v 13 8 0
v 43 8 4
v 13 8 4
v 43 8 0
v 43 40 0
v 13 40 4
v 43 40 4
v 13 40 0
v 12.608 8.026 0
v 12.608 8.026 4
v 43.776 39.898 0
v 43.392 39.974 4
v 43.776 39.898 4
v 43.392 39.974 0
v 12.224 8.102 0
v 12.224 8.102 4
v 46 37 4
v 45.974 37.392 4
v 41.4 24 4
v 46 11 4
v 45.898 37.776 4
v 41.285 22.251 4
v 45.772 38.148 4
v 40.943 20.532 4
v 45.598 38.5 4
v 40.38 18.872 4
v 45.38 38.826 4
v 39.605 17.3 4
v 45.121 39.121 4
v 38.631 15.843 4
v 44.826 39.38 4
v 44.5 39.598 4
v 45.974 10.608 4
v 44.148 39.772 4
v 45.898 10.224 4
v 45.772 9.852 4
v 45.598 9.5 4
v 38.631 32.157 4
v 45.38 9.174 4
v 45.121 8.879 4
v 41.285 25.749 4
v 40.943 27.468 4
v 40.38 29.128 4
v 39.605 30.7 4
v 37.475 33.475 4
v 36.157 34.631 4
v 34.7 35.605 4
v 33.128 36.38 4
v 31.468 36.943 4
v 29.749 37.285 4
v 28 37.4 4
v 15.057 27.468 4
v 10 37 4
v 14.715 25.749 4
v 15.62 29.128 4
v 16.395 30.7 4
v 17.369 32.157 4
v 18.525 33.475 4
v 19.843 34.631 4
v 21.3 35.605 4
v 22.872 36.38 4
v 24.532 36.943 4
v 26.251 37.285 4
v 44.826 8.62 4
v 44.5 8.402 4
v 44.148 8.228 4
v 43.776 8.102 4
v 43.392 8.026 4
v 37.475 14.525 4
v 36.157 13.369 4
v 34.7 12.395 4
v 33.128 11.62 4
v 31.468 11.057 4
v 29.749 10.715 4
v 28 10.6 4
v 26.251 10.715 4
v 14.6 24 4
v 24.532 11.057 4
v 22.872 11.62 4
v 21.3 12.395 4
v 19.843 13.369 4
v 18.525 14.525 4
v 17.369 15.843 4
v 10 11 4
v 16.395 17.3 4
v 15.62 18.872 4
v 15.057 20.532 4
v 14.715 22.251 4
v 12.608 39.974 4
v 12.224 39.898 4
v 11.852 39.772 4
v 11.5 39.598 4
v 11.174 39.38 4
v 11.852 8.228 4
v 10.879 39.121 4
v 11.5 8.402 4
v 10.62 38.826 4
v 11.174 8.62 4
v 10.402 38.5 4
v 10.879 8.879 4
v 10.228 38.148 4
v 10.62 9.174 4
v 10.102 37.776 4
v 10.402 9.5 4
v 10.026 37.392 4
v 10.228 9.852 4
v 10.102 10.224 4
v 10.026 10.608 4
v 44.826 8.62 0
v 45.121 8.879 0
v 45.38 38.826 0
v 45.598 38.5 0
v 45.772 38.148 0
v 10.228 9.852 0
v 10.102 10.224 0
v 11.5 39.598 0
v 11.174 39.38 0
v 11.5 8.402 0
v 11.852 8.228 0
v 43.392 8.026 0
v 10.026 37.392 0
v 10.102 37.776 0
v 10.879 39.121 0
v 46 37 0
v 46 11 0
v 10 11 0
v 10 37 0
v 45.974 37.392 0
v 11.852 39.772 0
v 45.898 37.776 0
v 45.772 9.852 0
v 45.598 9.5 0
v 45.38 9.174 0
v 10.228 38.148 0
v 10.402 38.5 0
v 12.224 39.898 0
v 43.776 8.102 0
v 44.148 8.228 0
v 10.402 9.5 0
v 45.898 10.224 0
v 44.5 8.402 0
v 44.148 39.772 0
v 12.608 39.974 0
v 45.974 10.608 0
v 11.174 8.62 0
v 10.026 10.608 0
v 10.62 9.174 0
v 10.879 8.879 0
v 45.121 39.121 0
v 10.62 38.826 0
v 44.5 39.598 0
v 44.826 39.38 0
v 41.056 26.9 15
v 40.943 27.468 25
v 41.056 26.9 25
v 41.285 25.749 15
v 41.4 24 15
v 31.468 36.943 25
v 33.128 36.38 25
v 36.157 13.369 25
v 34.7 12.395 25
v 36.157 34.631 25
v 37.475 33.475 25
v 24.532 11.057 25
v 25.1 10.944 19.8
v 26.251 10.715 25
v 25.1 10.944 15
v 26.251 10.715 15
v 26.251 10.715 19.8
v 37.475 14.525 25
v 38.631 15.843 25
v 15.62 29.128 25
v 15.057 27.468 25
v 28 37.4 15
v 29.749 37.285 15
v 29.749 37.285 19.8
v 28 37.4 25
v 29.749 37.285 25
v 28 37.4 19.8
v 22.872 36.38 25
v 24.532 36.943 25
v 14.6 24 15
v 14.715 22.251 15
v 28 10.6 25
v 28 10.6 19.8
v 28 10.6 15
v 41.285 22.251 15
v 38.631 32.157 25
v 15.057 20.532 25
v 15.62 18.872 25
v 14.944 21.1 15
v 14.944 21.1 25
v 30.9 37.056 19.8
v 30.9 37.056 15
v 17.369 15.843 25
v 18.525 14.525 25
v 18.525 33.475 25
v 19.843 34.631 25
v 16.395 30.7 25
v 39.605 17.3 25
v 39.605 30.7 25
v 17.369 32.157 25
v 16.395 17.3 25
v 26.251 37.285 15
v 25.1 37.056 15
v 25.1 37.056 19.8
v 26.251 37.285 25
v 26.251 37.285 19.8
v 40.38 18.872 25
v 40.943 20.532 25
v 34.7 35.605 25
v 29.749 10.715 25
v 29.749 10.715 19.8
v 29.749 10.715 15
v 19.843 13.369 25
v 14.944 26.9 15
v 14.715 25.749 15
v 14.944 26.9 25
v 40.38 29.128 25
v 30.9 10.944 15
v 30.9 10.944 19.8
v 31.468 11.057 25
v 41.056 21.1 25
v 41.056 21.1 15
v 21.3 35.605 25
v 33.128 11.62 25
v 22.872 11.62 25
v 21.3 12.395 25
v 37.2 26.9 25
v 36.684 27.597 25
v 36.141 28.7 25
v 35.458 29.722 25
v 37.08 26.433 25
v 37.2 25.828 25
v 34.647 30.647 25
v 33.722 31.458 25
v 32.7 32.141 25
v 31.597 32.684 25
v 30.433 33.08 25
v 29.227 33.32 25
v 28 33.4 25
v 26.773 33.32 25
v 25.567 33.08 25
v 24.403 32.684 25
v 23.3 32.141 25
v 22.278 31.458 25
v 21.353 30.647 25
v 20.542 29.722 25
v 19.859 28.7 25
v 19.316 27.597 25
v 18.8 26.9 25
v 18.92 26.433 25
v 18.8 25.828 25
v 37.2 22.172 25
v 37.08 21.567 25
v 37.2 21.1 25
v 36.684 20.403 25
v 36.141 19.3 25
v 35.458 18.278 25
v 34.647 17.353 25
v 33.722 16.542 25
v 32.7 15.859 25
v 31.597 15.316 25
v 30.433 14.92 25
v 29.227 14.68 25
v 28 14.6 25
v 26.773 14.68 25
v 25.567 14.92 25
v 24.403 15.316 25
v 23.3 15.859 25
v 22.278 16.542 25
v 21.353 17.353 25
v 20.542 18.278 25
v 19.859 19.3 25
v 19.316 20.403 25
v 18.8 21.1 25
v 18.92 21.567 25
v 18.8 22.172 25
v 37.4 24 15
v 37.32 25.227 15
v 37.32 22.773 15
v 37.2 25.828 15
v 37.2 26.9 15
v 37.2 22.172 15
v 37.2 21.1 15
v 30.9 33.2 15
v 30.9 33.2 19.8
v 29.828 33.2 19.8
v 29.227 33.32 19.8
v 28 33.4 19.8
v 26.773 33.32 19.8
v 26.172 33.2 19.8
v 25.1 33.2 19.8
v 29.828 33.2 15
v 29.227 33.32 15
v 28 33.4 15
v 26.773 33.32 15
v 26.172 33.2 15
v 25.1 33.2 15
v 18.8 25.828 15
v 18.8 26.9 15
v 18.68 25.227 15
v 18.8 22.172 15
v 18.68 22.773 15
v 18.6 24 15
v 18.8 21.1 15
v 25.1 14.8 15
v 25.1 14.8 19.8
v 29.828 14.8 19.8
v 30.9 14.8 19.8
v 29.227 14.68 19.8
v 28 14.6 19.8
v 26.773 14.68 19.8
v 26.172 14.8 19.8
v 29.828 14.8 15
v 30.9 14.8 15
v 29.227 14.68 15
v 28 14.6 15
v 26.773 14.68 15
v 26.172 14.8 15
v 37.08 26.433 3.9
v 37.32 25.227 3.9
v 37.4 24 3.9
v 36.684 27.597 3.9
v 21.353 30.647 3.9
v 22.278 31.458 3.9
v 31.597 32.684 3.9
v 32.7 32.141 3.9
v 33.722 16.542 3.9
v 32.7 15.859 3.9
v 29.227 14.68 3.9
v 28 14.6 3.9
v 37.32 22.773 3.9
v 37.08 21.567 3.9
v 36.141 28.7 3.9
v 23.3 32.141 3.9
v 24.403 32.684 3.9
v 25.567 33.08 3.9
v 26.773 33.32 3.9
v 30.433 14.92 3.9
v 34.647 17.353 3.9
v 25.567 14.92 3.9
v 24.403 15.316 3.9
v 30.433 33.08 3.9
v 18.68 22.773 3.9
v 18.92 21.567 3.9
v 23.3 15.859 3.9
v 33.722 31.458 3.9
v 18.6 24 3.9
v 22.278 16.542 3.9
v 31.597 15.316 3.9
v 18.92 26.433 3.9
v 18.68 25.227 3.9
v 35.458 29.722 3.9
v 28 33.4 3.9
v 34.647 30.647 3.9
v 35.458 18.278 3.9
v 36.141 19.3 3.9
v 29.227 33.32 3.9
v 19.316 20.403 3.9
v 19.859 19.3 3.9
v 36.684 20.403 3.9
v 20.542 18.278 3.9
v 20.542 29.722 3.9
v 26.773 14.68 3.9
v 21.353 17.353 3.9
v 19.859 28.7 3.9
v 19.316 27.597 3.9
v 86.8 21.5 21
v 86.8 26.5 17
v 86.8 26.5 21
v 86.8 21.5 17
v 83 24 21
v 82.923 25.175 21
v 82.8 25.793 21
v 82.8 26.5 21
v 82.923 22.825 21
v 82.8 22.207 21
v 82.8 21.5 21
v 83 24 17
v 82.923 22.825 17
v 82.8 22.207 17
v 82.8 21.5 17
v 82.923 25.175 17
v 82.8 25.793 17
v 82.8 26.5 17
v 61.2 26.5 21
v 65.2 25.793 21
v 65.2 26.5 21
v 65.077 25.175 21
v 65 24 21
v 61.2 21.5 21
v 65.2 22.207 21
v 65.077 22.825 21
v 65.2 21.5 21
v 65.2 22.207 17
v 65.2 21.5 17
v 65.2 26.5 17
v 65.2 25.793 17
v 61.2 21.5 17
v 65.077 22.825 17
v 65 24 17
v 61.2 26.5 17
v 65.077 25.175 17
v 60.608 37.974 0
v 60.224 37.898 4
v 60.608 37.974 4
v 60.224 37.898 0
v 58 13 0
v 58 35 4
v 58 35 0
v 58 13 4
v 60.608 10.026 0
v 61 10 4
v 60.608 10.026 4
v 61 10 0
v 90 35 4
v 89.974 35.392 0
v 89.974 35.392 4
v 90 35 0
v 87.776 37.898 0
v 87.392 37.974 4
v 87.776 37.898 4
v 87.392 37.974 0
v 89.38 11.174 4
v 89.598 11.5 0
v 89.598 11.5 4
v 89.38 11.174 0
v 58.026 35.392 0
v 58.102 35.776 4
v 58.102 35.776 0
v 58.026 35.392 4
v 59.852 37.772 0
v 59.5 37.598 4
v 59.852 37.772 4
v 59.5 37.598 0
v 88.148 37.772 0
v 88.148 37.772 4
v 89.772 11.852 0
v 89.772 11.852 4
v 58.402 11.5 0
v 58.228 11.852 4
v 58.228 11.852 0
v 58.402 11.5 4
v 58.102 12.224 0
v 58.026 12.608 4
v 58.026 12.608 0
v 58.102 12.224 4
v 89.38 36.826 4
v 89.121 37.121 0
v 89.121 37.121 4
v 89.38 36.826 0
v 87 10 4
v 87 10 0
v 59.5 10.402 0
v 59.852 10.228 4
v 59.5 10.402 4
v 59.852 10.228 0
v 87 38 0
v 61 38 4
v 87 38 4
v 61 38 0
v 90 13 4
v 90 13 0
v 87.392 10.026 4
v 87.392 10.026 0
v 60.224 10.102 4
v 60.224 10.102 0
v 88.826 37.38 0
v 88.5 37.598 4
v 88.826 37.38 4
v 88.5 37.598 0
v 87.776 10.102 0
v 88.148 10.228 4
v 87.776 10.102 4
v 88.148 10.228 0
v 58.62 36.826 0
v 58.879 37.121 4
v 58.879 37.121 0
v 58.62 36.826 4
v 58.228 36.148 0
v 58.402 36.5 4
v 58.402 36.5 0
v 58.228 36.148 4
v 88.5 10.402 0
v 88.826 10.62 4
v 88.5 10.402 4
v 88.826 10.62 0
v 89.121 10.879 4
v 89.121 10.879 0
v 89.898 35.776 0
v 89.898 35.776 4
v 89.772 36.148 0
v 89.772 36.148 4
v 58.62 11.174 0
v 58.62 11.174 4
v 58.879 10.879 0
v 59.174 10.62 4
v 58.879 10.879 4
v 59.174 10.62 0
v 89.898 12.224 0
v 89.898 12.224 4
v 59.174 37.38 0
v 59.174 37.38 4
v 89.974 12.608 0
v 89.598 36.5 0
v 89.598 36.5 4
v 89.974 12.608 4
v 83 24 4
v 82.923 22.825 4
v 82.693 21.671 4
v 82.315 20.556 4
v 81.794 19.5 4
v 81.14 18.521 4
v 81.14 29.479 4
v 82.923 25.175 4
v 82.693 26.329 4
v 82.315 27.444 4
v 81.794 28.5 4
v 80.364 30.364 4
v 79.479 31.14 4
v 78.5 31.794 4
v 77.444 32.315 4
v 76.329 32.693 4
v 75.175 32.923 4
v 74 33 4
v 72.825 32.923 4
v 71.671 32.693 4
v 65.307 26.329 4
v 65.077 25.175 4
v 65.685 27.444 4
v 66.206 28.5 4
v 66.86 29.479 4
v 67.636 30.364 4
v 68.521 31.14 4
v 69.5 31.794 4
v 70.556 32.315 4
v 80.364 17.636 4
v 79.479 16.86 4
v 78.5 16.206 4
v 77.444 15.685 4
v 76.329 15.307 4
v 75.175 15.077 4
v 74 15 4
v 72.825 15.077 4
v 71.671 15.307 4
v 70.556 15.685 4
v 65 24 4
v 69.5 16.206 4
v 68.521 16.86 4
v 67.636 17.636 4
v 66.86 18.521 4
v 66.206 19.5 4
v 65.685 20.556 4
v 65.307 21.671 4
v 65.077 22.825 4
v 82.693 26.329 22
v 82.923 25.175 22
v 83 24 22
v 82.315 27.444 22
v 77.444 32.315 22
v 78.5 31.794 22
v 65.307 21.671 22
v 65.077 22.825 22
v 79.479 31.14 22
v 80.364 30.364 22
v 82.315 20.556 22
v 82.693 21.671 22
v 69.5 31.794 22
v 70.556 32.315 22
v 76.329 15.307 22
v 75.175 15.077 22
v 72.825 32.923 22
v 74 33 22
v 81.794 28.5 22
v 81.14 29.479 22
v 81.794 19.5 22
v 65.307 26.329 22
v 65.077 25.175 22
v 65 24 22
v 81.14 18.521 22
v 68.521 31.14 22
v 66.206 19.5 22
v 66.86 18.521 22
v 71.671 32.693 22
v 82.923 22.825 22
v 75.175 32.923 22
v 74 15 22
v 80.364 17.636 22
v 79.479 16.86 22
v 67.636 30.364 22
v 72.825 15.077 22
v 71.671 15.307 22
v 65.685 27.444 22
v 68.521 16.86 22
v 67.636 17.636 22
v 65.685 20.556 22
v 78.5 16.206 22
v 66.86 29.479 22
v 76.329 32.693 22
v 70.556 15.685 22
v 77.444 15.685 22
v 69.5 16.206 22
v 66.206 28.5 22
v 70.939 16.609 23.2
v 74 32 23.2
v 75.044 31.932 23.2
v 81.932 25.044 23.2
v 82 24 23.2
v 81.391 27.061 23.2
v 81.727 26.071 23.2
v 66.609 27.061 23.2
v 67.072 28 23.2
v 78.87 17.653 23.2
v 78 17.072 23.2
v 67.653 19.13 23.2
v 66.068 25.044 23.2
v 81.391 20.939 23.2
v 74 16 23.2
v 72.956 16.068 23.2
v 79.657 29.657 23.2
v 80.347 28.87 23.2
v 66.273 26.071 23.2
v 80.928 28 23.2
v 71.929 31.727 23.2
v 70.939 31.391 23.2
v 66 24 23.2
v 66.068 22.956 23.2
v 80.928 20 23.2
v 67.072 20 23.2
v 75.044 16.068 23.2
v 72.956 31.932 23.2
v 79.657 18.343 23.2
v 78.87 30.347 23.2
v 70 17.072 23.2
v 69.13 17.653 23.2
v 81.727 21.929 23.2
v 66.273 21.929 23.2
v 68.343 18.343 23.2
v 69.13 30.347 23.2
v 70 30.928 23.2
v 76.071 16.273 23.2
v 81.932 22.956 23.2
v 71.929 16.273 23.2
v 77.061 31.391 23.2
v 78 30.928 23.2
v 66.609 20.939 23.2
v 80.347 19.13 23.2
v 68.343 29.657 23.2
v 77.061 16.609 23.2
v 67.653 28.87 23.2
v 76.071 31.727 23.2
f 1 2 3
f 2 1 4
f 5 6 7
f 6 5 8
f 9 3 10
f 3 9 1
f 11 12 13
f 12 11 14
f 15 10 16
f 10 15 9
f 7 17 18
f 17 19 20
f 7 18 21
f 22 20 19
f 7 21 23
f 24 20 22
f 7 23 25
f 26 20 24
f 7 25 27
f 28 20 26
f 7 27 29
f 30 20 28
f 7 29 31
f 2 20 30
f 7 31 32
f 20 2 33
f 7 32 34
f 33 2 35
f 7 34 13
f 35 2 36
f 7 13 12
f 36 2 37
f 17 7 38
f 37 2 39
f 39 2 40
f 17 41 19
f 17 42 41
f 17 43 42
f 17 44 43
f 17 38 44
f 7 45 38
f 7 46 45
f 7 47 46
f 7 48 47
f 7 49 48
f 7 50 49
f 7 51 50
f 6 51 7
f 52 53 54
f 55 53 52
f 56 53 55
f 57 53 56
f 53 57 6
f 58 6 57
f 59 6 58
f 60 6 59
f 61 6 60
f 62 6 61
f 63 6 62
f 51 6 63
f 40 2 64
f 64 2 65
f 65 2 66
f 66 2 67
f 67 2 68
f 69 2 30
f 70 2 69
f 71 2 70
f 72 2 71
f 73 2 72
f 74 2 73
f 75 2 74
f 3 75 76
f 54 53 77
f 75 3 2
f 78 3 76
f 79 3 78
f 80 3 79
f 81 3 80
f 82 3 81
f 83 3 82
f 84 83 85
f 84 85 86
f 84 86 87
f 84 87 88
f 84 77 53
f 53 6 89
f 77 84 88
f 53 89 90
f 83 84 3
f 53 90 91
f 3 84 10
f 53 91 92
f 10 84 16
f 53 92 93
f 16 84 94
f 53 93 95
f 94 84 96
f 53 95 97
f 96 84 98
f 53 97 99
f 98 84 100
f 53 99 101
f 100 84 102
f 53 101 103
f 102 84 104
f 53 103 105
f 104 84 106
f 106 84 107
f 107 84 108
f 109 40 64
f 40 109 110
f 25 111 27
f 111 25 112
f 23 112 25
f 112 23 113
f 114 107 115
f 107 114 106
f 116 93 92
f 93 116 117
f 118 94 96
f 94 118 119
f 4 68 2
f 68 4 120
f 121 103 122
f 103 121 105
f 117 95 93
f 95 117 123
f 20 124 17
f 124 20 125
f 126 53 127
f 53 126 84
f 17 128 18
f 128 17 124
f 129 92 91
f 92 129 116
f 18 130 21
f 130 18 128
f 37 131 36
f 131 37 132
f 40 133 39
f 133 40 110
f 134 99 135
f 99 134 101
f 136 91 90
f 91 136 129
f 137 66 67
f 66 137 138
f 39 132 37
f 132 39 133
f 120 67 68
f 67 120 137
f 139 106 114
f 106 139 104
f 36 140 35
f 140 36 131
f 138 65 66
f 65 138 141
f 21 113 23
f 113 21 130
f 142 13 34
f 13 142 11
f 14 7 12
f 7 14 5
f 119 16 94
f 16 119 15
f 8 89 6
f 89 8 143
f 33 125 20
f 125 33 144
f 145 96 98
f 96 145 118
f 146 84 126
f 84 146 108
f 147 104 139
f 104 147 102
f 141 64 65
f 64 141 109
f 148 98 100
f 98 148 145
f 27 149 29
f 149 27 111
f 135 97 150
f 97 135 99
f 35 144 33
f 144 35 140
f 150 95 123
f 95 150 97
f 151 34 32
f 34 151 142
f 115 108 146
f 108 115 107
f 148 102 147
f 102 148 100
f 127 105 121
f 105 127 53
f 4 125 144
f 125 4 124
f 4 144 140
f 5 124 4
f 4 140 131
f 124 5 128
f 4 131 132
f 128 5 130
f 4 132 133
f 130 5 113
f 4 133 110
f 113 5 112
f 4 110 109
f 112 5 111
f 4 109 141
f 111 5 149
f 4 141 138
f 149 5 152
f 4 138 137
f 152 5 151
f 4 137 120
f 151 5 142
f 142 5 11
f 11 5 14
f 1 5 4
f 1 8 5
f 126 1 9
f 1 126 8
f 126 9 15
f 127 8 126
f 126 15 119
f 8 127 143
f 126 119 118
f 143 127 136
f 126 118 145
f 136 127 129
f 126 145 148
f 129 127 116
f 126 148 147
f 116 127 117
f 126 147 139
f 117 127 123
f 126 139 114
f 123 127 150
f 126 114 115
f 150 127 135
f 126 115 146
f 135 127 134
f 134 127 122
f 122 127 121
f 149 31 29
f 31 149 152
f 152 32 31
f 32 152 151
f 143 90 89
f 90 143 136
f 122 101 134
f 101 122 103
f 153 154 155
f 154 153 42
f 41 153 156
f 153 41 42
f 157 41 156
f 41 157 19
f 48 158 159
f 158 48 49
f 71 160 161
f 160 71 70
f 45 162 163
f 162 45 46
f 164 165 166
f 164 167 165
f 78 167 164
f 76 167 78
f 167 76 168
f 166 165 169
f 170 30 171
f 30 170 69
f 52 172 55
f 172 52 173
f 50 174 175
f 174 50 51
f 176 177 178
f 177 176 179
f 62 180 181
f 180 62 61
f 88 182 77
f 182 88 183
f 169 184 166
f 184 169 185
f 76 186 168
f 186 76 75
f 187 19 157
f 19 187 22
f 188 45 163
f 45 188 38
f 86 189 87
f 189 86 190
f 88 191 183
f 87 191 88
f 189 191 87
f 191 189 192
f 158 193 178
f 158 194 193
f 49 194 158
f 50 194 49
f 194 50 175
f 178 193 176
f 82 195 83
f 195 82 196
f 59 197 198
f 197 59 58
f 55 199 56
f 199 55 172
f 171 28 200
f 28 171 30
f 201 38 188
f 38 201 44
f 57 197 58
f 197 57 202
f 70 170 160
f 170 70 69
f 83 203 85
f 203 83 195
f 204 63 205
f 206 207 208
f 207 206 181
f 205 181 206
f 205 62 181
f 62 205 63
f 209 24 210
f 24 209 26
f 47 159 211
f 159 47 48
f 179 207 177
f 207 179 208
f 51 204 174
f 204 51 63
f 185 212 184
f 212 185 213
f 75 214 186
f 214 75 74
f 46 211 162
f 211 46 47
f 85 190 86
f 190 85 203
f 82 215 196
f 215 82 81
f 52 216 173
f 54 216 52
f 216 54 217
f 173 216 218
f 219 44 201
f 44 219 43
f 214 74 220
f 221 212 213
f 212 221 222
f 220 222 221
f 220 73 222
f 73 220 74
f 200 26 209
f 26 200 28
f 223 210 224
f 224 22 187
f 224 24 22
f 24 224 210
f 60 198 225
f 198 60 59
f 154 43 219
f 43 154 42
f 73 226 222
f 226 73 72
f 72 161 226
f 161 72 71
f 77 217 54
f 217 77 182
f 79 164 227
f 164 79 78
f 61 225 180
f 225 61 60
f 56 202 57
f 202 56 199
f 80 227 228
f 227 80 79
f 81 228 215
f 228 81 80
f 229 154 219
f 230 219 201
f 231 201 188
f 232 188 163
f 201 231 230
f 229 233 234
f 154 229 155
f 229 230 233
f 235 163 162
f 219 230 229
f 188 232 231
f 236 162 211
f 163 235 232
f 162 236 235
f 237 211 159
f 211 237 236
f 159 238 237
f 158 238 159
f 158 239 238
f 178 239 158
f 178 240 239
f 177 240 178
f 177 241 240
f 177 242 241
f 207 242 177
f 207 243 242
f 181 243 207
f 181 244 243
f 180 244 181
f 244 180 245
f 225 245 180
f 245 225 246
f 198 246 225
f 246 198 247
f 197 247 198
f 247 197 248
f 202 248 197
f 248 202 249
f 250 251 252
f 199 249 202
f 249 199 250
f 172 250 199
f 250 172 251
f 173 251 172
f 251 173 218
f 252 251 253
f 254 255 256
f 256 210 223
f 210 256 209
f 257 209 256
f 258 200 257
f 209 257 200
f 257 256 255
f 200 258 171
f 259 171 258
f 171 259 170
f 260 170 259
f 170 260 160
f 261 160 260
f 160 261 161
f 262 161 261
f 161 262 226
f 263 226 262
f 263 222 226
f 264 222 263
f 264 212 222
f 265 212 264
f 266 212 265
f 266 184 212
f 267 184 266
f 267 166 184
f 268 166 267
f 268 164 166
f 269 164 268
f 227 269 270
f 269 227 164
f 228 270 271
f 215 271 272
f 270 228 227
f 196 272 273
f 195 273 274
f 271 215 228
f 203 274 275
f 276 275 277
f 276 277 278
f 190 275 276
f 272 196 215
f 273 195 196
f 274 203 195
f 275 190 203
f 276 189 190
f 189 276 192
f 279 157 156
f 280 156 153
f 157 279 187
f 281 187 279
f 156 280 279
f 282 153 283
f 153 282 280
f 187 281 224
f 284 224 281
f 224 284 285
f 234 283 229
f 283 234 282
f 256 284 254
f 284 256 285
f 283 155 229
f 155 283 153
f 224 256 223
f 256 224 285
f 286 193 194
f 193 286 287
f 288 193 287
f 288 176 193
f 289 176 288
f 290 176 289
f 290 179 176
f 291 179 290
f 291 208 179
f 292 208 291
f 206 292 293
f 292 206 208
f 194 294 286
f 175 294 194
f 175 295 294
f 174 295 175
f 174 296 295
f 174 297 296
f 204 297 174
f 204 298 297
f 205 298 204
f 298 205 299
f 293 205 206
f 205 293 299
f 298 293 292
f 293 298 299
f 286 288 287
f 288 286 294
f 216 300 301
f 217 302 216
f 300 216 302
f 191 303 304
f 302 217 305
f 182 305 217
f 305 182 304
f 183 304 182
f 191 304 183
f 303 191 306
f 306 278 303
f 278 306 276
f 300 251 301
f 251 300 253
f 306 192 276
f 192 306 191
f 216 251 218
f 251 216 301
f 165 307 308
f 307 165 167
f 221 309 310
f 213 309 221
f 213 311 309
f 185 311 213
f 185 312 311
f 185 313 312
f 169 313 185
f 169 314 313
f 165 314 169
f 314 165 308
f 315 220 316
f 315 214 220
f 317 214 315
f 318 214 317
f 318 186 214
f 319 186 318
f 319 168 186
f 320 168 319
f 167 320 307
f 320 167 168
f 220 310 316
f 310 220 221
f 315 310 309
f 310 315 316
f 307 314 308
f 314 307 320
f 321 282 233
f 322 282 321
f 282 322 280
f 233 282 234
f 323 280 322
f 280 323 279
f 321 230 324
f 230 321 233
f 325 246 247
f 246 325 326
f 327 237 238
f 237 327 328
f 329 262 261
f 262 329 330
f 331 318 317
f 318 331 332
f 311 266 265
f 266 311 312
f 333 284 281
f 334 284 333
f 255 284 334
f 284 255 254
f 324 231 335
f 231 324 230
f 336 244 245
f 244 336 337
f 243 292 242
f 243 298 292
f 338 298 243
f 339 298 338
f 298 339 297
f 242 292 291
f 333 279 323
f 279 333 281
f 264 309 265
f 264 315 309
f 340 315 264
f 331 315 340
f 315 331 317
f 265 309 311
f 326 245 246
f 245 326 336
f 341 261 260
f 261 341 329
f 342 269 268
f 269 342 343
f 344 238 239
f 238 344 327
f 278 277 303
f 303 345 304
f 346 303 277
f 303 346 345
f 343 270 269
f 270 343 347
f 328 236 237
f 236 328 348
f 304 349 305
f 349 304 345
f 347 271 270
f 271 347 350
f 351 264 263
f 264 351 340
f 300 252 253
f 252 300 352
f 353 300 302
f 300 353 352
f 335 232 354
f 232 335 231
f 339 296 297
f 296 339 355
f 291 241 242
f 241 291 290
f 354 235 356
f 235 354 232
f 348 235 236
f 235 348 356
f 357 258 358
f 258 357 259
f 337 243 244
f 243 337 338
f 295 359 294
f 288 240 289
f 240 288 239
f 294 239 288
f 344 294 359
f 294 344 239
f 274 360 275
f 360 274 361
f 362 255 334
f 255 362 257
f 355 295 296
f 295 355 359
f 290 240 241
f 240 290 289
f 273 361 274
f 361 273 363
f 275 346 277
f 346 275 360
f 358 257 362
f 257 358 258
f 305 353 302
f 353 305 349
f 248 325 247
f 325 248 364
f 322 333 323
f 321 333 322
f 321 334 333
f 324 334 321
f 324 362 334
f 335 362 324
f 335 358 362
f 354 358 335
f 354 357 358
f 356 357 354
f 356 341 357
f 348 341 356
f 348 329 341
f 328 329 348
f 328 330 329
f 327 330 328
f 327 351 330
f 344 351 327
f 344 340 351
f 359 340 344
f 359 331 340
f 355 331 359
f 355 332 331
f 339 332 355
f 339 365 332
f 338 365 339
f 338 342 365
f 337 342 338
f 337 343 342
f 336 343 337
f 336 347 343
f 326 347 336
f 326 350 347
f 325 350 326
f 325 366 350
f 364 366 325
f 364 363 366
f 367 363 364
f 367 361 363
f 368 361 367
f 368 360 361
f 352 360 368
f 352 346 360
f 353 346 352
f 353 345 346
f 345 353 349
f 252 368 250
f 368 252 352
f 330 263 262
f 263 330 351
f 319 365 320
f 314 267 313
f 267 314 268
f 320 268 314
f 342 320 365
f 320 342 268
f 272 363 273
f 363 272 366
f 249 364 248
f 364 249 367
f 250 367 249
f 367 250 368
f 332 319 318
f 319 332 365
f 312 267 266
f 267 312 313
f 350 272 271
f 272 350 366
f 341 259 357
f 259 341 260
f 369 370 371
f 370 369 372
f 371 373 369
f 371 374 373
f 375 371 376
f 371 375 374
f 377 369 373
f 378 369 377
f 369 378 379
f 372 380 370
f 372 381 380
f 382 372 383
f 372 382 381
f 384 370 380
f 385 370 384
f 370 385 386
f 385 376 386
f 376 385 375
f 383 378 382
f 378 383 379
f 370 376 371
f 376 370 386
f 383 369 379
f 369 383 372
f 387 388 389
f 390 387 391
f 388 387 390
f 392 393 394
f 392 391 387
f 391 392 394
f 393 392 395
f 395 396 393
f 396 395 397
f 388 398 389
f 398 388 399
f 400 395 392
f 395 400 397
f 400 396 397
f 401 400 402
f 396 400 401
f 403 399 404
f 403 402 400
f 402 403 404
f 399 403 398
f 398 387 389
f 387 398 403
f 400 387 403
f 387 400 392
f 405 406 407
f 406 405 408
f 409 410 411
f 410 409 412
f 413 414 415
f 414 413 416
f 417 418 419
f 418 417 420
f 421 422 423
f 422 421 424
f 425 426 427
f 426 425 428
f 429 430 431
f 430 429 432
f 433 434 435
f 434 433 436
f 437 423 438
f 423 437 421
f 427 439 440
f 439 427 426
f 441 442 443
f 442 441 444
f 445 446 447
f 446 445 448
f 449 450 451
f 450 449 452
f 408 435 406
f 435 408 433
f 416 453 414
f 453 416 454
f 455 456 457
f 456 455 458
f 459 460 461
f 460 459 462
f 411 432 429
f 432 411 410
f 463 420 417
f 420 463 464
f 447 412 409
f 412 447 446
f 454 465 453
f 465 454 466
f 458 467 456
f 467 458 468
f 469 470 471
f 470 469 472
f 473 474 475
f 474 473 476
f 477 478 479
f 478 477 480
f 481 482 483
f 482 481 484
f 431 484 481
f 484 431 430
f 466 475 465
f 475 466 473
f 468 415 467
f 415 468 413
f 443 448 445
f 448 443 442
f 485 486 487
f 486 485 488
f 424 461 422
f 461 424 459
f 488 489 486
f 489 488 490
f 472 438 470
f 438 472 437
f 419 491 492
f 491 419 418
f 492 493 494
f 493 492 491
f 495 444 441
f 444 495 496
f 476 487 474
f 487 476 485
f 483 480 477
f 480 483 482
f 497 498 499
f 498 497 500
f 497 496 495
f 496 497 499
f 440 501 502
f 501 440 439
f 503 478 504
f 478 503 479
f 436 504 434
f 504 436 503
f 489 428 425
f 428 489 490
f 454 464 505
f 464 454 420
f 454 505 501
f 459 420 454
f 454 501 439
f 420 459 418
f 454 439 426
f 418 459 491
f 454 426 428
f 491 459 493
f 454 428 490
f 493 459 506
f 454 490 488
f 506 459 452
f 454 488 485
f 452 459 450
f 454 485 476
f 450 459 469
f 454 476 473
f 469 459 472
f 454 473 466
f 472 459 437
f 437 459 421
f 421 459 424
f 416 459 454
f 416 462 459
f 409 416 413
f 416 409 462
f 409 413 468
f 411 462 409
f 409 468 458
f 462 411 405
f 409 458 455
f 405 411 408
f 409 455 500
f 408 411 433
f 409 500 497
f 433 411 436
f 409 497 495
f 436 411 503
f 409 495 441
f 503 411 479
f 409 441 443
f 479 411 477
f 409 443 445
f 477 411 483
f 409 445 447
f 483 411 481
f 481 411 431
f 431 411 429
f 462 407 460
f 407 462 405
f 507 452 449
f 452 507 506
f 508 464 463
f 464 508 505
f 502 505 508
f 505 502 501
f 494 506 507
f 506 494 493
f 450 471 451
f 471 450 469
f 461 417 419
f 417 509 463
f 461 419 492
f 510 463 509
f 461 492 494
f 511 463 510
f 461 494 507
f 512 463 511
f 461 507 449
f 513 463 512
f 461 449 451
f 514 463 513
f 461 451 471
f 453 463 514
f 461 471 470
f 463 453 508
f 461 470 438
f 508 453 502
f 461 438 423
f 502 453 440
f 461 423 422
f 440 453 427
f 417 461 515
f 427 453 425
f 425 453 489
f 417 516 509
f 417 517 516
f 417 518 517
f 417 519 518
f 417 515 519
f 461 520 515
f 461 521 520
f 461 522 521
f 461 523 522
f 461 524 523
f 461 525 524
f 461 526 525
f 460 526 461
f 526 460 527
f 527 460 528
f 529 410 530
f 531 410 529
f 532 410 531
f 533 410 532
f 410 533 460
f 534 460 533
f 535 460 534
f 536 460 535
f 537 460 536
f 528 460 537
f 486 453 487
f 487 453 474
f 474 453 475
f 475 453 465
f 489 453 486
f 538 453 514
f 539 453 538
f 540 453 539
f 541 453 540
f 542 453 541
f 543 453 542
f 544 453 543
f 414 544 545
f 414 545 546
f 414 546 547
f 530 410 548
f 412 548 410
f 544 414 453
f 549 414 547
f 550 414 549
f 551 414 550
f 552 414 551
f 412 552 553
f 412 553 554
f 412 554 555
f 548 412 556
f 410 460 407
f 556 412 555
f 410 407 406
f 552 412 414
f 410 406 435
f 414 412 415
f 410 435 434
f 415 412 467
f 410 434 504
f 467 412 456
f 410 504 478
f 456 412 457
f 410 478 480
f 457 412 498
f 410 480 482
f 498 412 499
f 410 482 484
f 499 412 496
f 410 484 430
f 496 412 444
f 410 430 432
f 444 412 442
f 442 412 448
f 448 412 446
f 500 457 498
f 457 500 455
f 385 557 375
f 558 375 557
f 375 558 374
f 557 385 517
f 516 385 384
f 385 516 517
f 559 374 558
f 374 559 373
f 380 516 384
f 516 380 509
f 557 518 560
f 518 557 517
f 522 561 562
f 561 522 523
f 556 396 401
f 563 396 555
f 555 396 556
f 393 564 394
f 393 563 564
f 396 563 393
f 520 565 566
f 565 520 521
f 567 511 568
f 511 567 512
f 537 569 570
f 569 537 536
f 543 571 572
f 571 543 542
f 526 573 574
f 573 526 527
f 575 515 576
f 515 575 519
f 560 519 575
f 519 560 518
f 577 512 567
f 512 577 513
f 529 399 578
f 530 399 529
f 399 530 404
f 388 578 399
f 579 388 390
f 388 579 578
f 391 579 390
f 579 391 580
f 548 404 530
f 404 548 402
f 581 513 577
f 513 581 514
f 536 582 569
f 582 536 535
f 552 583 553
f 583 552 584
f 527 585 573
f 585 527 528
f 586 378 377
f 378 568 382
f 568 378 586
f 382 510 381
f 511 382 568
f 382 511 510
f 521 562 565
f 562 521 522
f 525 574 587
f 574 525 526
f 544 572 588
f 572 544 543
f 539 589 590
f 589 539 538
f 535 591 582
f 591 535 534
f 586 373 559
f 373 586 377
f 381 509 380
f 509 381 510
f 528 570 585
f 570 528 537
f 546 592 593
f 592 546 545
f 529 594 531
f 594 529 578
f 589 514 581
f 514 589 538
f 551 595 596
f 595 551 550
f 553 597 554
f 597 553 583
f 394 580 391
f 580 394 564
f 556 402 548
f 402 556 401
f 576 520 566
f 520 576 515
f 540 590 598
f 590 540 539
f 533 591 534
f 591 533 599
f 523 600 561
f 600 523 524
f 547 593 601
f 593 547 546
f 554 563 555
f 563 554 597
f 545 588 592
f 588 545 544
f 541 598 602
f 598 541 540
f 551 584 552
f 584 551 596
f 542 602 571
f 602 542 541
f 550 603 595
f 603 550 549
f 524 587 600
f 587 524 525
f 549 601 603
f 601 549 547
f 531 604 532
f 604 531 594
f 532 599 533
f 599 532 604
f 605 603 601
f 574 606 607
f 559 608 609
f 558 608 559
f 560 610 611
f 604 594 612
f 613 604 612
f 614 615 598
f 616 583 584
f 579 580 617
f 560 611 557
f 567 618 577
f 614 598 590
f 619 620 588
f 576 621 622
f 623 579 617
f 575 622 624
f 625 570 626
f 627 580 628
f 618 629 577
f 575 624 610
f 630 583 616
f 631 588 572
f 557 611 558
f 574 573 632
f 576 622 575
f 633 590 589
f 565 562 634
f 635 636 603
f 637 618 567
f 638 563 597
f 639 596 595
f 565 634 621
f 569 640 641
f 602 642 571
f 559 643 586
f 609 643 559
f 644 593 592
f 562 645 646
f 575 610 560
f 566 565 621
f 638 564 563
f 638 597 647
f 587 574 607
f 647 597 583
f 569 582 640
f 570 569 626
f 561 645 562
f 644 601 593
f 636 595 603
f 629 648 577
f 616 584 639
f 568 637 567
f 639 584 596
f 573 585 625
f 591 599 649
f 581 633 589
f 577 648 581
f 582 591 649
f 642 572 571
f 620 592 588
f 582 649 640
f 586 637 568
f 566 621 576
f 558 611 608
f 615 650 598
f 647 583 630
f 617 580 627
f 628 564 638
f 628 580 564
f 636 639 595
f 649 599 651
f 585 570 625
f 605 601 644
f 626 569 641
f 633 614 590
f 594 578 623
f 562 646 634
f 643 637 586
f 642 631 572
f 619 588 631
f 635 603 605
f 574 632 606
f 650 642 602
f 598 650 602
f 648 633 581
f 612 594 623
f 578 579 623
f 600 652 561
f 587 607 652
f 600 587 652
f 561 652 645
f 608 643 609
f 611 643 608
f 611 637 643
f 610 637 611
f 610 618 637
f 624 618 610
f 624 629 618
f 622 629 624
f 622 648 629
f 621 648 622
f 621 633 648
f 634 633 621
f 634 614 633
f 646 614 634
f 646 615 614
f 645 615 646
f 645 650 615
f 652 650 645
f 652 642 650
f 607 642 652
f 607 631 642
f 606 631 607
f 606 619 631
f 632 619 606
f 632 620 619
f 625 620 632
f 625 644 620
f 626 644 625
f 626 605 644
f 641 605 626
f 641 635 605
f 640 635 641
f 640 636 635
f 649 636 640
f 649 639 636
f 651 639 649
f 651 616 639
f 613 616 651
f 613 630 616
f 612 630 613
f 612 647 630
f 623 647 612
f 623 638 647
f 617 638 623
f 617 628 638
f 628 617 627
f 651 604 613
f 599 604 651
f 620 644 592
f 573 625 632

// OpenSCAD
/*
Sample 079: Bajonett-Vierteldrehverschluss — 0,40 mm
Generated from the FDM Mechanical Sample Library.
Units: millimetres.

Override examples:
  openscad -o custom.stl -D 'view="plate"' -D 'render_fn=64' model.scad
  openscad -o preview.png -D 'view="assembly"' model.scad
*/
use <../../../library/fdm_mechanisms.scad>

render_fn = is_undef(render_fn) ? 48 : render_fn;
view = is_undef(view) ? "plate" : view;
$fn = render_fn;

sample_bayonet(
    view=view,
    core_d=18,
    clearance=0.4,
    lug_w=5
);
